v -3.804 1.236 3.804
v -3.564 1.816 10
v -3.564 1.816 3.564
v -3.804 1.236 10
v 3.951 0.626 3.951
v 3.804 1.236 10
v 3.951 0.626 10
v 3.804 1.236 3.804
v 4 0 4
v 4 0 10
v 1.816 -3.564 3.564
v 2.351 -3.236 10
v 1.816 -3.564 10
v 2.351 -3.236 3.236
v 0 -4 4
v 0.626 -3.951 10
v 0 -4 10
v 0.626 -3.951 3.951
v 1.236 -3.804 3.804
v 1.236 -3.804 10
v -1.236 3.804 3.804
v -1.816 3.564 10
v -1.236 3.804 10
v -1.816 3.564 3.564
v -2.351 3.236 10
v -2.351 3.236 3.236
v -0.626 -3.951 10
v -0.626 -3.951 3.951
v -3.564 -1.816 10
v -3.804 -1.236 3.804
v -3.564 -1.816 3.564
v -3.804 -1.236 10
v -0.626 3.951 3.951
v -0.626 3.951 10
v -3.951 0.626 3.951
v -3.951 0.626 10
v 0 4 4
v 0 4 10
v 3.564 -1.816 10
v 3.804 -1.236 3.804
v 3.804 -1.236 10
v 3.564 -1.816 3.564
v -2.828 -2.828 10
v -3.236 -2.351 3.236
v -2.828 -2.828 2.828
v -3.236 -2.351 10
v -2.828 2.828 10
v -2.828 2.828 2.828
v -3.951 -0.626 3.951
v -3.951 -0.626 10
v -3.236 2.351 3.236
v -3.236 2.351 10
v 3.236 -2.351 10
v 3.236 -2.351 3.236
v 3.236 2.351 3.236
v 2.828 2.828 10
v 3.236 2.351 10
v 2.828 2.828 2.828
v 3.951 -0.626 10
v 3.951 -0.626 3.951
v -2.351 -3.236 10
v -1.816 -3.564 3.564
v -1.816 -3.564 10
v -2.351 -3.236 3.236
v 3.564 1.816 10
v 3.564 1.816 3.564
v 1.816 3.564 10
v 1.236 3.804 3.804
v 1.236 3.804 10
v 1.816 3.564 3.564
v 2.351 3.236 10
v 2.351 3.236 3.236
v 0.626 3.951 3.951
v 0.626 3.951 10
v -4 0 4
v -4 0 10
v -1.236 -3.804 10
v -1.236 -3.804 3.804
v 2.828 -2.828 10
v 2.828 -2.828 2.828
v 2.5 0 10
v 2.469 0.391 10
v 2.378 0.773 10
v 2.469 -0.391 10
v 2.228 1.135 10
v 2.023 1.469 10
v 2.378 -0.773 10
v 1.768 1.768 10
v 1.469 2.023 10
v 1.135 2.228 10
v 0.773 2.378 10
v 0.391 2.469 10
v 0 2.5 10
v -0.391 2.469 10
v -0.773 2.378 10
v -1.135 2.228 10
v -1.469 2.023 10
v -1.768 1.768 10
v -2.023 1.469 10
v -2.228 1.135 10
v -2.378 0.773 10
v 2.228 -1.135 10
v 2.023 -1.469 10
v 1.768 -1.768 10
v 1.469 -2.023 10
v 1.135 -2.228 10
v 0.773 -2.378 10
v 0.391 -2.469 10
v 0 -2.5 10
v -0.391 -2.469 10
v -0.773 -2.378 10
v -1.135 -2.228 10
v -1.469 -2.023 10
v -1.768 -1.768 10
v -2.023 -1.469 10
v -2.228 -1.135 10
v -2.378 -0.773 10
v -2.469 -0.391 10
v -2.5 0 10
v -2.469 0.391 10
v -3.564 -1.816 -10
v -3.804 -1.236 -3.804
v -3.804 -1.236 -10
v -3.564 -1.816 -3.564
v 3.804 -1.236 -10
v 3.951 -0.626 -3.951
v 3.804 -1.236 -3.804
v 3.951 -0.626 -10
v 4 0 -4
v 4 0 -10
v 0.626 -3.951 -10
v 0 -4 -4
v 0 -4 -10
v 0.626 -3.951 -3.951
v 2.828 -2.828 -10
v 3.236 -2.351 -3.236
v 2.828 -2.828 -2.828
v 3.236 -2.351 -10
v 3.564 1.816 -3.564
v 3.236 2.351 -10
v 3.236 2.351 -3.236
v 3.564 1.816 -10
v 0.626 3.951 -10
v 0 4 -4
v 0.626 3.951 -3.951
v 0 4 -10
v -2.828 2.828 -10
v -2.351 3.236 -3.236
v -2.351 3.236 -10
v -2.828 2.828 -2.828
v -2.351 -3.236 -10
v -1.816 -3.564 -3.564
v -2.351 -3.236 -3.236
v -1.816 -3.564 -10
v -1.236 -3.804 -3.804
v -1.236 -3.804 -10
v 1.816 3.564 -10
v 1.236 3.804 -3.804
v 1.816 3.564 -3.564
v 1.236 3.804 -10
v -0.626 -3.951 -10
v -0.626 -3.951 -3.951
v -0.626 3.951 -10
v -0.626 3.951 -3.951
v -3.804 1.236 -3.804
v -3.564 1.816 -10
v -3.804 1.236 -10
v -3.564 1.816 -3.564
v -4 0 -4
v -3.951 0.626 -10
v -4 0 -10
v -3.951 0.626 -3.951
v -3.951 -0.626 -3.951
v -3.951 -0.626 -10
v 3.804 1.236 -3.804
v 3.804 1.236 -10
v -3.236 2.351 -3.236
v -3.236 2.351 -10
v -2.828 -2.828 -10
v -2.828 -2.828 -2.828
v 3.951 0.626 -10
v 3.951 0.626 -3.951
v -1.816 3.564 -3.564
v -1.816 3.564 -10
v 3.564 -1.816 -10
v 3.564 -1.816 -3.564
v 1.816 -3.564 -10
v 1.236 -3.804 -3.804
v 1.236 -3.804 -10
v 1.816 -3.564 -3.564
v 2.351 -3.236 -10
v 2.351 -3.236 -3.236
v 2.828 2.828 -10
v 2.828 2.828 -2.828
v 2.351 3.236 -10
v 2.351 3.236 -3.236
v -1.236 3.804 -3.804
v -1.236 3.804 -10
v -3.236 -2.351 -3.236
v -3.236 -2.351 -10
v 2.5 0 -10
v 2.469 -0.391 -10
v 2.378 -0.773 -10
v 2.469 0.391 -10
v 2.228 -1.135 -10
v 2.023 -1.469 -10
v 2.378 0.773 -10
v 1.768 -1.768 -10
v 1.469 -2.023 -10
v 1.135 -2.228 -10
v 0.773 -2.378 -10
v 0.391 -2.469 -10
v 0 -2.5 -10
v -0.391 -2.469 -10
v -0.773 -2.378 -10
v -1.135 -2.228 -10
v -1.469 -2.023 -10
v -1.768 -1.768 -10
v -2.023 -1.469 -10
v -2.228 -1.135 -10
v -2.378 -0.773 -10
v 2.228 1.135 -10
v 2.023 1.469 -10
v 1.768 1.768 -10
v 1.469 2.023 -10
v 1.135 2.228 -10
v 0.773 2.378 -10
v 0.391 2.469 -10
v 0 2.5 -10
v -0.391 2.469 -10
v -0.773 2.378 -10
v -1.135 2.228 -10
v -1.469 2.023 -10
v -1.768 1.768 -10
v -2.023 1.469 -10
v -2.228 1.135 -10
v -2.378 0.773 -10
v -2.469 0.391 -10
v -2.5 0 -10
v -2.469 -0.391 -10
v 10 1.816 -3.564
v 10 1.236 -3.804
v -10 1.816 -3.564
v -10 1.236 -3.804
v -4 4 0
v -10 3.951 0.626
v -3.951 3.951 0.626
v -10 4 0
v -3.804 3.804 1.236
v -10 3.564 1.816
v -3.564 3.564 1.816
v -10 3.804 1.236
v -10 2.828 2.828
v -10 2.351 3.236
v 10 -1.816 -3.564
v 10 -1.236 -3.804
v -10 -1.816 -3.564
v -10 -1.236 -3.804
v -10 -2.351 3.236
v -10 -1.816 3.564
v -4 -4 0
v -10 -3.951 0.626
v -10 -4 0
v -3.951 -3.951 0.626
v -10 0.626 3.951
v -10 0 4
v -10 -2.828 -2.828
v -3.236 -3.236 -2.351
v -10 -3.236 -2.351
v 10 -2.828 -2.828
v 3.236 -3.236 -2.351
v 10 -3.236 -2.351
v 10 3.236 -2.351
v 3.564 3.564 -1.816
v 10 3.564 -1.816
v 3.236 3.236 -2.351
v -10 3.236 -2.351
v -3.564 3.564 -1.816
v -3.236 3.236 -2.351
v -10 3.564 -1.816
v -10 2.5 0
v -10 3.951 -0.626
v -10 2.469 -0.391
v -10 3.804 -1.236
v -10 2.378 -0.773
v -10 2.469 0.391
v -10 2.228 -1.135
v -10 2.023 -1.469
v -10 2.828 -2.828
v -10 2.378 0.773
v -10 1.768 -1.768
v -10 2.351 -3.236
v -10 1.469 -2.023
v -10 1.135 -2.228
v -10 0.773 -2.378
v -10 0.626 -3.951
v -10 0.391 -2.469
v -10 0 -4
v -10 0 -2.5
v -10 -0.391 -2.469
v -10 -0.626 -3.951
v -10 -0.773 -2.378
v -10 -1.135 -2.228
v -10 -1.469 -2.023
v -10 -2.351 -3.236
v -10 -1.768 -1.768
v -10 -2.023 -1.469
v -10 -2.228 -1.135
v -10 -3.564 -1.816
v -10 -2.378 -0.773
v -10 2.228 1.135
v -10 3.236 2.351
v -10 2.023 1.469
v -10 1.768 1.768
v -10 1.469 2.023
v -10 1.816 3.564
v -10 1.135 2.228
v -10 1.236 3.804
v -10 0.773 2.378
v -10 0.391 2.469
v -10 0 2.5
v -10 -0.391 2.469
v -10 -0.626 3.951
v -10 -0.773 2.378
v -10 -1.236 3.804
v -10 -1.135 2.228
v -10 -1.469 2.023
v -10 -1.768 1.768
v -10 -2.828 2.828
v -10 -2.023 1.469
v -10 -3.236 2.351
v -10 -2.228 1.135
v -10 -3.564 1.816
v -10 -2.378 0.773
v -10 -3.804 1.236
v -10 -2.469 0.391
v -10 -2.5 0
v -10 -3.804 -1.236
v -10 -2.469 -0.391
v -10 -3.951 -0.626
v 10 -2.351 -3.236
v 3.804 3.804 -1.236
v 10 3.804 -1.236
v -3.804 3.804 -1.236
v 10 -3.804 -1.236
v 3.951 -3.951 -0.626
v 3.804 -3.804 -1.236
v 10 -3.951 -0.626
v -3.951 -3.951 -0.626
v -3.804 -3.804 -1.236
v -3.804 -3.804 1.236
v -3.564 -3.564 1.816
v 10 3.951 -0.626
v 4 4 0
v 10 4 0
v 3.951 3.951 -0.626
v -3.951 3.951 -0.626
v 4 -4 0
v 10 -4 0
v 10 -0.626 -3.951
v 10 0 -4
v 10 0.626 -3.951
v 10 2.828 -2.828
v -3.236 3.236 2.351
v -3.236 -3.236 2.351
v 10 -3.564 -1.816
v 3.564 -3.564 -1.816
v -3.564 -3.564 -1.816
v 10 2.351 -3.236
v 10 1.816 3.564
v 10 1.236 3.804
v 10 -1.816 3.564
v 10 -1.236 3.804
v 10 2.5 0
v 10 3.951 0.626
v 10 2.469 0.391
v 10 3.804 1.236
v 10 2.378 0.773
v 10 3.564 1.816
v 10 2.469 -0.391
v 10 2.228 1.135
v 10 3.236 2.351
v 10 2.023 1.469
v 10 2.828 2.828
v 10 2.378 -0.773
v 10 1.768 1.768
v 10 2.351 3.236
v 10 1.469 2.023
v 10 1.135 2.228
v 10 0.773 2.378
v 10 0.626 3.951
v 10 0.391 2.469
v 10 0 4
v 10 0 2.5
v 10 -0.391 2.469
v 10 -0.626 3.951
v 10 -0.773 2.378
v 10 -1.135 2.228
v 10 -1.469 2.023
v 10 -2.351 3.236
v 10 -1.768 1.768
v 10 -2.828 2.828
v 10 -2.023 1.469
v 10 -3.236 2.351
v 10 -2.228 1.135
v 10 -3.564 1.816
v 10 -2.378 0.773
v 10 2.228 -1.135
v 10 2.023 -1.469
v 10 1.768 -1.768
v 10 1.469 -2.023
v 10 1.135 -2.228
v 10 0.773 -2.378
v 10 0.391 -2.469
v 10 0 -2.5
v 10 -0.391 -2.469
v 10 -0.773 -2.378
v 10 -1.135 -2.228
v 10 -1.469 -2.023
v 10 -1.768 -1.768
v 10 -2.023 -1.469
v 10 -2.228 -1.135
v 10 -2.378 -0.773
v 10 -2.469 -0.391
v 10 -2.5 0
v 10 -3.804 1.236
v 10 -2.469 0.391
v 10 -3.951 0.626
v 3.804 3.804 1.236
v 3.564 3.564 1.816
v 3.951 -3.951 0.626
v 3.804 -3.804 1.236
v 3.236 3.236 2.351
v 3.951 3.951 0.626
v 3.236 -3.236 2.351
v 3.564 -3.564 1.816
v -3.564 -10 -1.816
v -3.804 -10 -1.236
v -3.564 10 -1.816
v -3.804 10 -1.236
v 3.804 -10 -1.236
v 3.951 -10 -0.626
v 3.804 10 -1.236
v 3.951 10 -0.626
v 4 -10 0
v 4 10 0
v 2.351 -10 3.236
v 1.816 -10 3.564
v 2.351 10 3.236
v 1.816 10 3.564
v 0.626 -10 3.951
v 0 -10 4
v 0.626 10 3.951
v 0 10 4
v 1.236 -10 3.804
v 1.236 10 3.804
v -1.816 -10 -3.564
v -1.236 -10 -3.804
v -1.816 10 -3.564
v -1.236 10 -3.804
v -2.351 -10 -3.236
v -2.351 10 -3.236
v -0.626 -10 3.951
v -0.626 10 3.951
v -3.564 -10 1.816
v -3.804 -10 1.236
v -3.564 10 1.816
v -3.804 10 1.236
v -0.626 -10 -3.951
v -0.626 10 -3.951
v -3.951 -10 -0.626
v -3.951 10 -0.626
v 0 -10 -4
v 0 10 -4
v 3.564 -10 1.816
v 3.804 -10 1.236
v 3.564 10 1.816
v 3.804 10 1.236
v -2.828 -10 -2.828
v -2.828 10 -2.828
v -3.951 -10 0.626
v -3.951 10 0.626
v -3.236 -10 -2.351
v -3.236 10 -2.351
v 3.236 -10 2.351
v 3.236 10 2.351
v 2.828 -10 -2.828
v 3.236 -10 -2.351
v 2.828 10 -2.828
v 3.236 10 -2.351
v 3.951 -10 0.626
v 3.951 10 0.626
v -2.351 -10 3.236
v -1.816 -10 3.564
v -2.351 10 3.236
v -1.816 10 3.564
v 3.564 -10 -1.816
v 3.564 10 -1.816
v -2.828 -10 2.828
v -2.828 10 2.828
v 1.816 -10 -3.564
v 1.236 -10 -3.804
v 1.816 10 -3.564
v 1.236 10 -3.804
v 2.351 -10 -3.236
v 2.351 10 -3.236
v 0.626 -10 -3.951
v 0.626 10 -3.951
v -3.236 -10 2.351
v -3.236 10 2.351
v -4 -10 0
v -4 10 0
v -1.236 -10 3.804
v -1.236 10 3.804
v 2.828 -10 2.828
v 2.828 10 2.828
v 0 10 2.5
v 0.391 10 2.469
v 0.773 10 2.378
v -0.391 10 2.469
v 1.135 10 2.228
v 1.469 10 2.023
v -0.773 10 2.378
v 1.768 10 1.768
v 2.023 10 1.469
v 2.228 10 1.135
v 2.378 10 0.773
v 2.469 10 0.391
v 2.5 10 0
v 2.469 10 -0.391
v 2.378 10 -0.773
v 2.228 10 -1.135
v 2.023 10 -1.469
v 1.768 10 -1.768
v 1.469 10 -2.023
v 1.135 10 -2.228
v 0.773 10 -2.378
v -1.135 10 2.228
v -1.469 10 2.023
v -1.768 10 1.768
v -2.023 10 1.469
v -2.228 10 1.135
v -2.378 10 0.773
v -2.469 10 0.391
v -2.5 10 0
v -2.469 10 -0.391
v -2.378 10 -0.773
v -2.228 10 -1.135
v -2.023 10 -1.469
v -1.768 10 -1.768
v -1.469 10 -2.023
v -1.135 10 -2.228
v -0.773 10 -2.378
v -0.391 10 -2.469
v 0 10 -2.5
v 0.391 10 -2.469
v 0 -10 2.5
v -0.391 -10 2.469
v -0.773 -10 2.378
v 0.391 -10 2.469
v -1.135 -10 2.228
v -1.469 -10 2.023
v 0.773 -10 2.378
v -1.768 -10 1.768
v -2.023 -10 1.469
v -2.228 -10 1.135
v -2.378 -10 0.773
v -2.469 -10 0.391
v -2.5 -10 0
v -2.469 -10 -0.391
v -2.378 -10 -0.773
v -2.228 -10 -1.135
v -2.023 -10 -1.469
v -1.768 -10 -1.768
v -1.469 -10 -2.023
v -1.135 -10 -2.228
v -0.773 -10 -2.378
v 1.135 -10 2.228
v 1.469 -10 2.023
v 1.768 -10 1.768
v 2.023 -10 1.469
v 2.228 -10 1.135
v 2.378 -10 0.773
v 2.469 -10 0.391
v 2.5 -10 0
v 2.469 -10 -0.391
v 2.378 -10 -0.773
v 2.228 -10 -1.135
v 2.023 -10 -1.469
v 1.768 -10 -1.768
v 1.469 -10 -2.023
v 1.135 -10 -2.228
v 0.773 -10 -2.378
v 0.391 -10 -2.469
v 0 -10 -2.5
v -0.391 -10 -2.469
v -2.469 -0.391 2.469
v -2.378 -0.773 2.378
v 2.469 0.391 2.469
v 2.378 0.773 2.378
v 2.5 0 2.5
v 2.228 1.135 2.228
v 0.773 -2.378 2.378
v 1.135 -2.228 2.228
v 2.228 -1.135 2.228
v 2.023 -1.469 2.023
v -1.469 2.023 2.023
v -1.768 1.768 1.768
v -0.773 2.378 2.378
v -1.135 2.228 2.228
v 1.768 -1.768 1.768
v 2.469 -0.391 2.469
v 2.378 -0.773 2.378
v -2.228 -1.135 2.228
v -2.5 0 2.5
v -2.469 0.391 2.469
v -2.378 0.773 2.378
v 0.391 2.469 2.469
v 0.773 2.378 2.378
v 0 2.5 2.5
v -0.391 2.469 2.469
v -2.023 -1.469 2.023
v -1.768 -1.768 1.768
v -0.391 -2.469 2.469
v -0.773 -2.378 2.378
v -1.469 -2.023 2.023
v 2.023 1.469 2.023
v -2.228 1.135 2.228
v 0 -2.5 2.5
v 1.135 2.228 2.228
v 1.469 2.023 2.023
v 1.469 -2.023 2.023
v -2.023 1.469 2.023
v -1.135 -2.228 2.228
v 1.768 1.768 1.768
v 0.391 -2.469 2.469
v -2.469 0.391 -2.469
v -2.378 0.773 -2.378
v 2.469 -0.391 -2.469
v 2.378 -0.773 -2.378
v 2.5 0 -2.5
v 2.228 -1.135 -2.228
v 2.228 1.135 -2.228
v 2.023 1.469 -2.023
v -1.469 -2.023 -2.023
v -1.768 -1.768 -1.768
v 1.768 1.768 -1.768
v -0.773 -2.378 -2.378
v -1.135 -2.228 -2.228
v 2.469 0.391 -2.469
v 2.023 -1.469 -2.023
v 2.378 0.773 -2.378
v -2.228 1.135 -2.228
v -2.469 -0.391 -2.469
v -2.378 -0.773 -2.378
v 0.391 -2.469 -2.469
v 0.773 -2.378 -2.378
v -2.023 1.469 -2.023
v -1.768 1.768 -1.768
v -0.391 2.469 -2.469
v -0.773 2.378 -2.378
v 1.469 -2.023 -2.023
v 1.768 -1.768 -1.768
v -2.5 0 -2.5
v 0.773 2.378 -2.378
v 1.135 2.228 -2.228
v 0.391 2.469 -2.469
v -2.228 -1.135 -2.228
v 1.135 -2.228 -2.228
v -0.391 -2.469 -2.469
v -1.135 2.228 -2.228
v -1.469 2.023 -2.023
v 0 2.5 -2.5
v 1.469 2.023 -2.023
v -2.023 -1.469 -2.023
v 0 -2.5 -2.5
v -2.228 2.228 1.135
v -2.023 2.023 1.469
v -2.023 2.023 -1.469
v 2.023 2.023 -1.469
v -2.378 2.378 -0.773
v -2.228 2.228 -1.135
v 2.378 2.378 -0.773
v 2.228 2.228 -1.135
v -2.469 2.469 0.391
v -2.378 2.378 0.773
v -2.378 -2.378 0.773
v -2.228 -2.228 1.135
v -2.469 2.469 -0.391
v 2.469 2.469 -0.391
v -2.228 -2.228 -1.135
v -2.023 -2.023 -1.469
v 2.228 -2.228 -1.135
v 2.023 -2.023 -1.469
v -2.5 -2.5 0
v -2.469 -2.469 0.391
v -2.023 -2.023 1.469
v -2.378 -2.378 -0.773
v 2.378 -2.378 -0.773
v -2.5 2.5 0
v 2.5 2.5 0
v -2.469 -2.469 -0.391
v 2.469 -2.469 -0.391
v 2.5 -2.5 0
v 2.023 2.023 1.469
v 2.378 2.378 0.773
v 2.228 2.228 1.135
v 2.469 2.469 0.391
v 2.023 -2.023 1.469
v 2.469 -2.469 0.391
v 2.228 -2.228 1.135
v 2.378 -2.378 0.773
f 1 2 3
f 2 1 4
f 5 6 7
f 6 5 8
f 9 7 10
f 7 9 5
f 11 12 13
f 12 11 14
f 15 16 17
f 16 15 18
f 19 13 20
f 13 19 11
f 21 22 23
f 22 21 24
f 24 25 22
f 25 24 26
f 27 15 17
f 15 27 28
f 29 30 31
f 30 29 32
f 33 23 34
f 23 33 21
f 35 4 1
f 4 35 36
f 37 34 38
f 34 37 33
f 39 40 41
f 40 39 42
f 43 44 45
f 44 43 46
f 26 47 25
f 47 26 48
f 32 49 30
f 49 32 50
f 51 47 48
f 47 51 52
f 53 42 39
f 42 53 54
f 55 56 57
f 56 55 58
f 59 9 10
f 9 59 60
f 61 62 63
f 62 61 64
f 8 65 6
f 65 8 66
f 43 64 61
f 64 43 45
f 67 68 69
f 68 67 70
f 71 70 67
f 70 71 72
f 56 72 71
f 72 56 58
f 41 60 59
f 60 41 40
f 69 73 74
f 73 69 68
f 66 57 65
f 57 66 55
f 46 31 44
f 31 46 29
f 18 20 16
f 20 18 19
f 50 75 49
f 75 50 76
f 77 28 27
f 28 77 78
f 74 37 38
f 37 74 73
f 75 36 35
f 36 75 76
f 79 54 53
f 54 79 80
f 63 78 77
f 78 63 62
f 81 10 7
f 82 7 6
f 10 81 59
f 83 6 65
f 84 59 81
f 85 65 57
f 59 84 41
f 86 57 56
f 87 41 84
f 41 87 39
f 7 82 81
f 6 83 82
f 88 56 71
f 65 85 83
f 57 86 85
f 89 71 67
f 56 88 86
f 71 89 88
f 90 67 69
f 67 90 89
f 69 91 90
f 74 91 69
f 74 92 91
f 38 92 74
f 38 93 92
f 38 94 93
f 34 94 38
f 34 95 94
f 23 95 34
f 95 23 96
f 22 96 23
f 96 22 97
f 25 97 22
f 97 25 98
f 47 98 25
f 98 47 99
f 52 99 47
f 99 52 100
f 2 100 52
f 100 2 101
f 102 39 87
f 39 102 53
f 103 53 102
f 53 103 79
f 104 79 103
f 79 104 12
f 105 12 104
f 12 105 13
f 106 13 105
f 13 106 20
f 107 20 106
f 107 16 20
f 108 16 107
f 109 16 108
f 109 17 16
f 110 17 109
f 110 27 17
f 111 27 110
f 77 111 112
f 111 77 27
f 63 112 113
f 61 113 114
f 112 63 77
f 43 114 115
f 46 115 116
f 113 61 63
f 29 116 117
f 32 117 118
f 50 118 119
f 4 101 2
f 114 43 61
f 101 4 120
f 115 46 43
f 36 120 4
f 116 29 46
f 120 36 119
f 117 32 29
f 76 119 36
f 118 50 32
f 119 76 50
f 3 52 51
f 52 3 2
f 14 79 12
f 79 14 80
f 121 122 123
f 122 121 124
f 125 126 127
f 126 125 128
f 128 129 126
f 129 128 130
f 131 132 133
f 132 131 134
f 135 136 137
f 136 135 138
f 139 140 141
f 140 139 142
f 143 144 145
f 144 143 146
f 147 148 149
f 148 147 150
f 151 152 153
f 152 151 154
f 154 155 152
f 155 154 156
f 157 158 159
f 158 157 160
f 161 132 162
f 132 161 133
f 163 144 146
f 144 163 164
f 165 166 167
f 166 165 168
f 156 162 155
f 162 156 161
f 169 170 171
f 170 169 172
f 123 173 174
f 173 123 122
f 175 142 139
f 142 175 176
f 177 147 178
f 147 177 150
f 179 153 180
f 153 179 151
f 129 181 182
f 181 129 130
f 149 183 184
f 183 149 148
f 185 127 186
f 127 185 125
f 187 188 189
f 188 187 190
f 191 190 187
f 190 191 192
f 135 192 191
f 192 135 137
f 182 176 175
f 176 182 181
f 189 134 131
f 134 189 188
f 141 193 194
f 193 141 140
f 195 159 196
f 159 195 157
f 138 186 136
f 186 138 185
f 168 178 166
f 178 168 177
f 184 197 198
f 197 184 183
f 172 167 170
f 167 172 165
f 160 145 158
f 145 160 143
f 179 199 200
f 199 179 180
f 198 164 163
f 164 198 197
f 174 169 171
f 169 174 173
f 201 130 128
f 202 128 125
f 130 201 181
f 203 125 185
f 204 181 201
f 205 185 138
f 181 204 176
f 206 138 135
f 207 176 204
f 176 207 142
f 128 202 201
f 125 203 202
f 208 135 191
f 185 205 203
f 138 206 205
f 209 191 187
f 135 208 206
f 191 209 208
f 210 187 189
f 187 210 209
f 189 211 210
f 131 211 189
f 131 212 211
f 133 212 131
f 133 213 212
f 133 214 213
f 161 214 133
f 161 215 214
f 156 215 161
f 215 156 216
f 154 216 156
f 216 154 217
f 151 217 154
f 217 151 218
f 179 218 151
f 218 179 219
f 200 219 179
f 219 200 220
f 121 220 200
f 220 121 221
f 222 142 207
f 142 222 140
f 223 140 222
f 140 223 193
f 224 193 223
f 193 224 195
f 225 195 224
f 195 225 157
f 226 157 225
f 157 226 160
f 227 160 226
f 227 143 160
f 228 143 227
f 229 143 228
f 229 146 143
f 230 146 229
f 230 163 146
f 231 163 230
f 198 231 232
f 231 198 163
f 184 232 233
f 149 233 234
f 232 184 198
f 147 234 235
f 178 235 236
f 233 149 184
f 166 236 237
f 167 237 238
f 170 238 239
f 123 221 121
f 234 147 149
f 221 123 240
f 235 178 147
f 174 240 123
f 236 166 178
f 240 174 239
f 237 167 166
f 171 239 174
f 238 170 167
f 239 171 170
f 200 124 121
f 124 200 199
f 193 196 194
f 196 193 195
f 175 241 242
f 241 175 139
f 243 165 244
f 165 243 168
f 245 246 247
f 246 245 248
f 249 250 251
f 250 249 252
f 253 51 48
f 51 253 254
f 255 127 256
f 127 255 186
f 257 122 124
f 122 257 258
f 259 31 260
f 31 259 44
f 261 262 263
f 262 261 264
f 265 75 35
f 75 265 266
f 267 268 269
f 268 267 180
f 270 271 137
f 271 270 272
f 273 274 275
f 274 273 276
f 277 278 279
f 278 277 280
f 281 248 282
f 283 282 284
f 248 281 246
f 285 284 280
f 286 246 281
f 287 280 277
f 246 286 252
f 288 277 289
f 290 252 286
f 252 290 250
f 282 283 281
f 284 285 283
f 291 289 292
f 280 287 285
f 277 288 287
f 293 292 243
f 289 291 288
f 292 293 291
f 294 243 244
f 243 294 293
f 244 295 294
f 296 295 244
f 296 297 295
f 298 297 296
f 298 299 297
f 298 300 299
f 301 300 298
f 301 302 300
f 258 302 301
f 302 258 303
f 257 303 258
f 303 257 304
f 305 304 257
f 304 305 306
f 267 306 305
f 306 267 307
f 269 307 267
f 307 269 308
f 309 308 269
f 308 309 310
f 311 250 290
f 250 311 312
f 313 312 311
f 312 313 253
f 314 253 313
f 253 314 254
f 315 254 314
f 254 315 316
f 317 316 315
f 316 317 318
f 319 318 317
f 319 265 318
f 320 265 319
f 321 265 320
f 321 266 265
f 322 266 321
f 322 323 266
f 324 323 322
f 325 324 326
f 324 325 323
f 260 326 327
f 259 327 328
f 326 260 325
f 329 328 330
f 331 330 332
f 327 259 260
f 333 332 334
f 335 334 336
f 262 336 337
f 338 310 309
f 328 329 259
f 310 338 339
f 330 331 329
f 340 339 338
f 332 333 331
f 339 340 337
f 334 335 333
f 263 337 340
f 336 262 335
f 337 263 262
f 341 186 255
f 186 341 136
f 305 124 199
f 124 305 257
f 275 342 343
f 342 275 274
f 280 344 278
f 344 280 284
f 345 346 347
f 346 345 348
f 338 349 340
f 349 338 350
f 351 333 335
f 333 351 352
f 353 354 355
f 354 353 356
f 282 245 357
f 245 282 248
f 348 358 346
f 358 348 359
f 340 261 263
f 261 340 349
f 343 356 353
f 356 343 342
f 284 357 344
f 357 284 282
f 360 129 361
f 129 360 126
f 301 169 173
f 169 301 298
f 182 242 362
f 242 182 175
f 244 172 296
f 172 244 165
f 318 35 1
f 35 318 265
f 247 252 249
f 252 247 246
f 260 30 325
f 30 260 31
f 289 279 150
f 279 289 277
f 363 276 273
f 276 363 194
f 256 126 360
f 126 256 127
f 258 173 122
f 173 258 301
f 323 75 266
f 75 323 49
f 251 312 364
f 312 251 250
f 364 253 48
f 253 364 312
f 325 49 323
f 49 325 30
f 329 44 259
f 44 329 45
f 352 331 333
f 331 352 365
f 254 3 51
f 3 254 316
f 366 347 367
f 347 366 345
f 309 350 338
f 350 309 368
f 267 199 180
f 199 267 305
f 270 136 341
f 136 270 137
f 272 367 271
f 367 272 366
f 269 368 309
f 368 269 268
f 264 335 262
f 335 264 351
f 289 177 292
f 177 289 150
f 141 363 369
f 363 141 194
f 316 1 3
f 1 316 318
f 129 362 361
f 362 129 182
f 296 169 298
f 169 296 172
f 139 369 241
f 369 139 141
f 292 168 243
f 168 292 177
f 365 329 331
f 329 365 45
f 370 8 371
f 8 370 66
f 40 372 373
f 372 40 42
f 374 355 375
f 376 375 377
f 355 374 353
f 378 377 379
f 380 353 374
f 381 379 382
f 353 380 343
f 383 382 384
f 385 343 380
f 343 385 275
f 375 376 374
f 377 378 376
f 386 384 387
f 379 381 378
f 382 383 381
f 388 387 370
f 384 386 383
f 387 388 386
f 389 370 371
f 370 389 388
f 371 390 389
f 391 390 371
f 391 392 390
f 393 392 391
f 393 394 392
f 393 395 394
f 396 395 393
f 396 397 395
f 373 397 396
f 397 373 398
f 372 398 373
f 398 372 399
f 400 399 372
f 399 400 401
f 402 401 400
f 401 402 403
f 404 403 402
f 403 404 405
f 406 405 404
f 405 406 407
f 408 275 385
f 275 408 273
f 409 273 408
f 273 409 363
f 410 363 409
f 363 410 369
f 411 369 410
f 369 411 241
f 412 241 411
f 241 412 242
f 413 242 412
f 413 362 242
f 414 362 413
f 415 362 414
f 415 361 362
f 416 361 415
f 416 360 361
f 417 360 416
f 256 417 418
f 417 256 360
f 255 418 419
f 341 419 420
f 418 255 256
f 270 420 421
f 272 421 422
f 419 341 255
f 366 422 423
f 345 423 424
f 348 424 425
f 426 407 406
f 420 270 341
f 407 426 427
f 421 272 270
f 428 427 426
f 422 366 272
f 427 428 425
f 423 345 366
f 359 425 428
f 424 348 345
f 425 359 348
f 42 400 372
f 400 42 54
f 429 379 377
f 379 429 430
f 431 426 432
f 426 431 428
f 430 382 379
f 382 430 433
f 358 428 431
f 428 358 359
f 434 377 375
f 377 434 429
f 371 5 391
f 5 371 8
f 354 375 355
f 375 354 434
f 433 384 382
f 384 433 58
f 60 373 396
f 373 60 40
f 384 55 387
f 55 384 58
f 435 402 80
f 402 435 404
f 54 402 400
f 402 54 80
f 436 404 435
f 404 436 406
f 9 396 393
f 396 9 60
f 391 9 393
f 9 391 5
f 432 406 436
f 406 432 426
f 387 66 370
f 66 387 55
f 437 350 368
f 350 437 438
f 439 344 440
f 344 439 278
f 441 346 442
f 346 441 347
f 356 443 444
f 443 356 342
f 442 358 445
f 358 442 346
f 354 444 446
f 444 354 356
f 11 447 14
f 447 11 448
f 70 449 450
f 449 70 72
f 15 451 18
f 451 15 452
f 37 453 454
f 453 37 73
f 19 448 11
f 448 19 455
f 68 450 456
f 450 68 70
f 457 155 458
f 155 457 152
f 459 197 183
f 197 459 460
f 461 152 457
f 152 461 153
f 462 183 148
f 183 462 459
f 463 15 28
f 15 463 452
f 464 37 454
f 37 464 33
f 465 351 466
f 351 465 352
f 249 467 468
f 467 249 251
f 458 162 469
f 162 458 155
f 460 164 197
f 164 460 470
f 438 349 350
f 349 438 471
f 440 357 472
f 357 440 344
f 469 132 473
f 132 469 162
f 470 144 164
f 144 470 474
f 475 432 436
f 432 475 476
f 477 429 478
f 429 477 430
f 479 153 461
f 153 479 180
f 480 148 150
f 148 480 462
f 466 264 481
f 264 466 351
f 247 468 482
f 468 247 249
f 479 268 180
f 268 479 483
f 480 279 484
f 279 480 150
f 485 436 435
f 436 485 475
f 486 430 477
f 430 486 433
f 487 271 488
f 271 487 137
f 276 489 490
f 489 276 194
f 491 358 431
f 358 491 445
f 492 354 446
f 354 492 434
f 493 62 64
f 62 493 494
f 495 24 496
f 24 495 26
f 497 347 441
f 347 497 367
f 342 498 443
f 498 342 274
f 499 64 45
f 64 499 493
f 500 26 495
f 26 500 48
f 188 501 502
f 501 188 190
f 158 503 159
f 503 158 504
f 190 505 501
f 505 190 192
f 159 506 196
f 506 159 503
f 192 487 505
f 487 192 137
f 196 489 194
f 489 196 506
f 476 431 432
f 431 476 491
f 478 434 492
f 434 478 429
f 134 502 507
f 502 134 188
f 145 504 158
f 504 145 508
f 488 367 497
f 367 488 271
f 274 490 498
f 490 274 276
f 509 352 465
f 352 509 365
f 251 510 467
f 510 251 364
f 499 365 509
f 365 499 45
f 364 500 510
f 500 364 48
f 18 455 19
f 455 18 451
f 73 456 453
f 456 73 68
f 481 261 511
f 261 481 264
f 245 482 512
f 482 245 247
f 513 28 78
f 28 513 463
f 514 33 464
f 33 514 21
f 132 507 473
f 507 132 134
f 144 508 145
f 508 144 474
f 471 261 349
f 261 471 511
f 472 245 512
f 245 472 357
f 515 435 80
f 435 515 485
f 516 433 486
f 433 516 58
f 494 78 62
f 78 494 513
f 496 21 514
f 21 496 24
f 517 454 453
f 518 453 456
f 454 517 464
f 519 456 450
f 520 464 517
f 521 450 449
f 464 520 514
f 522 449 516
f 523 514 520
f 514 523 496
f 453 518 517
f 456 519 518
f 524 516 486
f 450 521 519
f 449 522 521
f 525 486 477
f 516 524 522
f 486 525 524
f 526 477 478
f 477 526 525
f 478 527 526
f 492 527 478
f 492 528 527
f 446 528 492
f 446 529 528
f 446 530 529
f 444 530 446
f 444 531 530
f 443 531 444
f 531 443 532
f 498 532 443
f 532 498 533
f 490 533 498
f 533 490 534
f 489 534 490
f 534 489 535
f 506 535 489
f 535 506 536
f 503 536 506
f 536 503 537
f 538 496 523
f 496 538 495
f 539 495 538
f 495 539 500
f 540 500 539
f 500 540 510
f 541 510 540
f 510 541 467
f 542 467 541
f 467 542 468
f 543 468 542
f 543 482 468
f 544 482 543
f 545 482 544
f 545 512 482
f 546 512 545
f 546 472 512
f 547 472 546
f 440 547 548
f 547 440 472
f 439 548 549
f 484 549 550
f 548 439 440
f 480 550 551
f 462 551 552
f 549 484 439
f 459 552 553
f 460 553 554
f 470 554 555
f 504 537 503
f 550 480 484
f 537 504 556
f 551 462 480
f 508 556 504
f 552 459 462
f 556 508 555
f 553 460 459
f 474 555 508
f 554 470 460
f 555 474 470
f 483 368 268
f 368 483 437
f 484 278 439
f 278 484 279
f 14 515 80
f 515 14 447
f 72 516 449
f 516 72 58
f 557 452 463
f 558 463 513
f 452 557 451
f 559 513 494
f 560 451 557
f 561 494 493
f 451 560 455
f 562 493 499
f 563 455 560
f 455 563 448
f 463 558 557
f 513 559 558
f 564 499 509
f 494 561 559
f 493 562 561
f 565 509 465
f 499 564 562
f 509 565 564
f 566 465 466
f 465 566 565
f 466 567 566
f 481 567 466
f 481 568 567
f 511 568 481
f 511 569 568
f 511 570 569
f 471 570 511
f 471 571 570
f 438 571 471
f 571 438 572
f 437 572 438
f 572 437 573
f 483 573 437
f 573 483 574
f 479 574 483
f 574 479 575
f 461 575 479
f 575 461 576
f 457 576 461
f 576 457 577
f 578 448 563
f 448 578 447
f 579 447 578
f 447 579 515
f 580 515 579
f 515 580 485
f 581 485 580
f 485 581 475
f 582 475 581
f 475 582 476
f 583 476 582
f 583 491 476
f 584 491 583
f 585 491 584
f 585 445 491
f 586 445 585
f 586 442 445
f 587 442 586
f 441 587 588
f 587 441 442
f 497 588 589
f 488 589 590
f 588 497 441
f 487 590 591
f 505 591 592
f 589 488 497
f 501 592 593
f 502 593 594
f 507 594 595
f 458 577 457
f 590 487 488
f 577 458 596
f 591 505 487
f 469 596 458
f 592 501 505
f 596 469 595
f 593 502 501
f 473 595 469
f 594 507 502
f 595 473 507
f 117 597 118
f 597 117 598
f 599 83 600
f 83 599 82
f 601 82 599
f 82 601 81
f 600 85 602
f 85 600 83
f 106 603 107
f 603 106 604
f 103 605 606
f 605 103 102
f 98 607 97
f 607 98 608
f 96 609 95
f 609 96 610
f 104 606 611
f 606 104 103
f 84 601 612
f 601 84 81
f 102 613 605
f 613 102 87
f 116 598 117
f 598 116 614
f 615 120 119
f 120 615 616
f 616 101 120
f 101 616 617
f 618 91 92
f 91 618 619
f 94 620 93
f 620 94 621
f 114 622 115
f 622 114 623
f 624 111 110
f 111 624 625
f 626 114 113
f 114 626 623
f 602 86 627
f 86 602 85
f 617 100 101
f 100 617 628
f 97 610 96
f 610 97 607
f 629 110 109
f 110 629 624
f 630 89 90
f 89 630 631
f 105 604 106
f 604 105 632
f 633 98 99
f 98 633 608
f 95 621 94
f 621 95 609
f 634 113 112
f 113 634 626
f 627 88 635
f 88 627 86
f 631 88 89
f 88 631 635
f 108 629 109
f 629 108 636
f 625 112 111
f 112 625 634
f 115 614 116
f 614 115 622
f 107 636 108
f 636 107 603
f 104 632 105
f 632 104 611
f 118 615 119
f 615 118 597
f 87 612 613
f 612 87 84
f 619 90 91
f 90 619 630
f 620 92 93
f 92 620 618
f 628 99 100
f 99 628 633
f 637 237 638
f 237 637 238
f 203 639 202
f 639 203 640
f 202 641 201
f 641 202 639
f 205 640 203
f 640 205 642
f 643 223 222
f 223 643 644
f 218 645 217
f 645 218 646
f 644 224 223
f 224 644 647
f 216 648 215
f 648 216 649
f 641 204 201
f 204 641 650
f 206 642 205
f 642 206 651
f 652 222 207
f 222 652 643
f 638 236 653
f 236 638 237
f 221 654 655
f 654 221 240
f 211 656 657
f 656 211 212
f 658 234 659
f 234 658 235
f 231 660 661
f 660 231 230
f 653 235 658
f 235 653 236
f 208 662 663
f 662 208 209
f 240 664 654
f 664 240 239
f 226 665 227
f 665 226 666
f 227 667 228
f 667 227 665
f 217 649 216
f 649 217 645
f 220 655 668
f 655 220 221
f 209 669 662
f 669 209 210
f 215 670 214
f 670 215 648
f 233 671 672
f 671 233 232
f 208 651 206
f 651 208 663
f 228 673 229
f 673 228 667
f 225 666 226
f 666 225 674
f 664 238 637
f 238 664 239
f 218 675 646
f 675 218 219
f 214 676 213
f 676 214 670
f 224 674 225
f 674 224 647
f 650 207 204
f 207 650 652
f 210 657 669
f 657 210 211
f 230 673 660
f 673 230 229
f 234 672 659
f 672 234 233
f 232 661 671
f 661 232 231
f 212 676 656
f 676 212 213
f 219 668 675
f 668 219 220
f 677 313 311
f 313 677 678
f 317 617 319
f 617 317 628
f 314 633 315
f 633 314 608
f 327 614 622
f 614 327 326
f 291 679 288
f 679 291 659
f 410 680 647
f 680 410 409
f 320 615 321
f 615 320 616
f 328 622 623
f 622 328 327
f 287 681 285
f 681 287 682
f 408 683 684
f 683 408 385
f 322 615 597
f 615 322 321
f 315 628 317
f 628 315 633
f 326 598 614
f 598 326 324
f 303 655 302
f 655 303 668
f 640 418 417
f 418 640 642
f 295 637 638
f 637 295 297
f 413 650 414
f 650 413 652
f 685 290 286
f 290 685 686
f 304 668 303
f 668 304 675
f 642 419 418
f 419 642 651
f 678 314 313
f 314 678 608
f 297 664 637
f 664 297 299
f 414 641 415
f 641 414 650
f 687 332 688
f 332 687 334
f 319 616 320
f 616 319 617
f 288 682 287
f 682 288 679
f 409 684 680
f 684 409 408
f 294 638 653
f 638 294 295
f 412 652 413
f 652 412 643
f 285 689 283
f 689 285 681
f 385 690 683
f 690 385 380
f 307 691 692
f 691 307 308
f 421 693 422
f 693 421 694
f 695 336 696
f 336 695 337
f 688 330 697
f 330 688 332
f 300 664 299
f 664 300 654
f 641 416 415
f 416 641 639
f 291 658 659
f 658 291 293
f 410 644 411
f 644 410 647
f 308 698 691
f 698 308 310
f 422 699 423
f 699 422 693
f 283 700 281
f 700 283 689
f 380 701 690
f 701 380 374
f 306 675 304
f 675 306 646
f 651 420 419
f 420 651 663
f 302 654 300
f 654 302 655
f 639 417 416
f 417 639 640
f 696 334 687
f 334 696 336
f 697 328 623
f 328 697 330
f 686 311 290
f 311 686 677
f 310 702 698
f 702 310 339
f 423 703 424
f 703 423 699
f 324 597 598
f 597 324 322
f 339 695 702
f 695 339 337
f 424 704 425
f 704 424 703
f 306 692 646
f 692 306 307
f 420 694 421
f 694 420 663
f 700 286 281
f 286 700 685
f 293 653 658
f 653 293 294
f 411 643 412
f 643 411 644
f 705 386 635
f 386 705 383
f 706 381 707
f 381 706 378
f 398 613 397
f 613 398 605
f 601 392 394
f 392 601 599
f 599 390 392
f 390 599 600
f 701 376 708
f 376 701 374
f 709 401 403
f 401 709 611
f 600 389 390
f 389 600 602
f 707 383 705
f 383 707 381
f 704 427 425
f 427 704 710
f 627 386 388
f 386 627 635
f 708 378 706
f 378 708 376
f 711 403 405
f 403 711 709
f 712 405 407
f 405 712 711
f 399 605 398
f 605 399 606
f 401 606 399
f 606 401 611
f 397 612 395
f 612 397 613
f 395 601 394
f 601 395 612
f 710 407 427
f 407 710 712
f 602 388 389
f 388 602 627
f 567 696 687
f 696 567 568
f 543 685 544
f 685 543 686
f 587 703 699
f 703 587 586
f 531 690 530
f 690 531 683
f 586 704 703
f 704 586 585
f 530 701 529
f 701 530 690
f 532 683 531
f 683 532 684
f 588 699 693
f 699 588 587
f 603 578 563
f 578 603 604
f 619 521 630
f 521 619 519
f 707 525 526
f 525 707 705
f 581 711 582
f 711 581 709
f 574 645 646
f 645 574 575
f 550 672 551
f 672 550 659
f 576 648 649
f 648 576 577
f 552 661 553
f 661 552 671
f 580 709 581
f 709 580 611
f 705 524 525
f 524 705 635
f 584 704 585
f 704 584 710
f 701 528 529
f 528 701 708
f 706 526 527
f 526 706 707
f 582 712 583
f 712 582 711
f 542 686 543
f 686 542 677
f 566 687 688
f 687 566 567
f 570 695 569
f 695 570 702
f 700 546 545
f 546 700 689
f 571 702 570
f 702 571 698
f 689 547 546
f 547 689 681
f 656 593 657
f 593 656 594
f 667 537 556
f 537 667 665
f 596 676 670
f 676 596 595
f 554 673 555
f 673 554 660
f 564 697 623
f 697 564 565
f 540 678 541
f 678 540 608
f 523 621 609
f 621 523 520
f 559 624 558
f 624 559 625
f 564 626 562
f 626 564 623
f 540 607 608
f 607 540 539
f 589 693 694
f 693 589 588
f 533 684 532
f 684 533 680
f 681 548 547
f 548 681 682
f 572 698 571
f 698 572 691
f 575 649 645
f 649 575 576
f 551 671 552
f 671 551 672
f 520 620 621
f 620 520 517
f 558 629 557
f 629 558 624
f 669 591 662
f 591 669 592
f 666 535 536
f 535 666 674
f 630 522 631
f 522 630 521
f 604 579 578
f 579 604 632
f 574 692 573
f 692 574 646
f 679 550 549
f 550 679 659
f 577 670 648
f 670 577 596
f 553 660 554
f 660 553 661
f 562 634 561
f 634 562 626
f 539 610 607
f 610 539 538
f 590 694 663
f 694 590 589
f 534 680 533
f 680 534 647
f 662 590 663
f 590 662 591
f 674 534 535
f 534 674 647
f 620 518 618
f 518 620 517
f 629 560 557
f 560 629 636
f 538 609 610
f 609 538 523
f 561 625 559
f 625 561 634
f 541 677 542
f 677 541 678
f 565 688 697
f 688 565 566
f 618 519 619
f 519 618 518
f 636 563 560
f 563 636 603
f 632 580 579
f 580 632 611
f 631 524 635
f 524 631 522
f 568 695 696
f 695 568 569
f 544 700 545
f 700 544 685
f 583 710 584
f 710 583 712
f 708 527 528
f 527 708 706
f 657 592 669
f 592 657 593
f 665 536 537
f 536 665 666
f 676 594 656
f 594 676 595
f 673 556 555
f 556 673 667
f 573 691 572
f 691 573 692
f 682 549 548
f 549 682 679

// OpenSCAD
center = [0, 0, 0]; // v[9]

neighbors = [ [0, 0, 1],
              [0, 0, -1],
              [-1, 0, 0],
              [1, 0, 0],
              [0, 1, 0],
              [0, -1, 0] ];

connector(center, neighbors);

module connector(center, neighbors)
{
    rod_diameter = 5;    // 3/16 inch = 4.7625mm
    conn_thick   = 3;
    conn_len     = 10;

    module rod(center, neighbor, diameter, extra_len) {
        n = neighbor - center; // normalize center at (0, 0, 0)
        length = sqrt(n*n);
        echo(length);
        theta = acos(n * [0, 0, 1] / sqrt(n*n));
        cross_prod = cross([0, 0, 1], n);
        axis = (cross_prod == [0, 0, 0] && theta == 180) ? [1, 0, 0] : cross_prod;
        rotate(theta, axis)
        translate(0, 0, 100)
        cylinder(h = conn_len + extra_len, d = diameter, center = false, $fn = 40);
    }

    difference() {
        union()
        {
            for (i = [0: len(neighbors)-1]) {
                rod(center, neighbors[i], rod_diameter+conn_thick, 0);
            }
        }
        for (i = [0: len(neighbors)-1]) {
            rod(center, neighbors[i], rod_diameter, 0.1);
        }
    }
}
